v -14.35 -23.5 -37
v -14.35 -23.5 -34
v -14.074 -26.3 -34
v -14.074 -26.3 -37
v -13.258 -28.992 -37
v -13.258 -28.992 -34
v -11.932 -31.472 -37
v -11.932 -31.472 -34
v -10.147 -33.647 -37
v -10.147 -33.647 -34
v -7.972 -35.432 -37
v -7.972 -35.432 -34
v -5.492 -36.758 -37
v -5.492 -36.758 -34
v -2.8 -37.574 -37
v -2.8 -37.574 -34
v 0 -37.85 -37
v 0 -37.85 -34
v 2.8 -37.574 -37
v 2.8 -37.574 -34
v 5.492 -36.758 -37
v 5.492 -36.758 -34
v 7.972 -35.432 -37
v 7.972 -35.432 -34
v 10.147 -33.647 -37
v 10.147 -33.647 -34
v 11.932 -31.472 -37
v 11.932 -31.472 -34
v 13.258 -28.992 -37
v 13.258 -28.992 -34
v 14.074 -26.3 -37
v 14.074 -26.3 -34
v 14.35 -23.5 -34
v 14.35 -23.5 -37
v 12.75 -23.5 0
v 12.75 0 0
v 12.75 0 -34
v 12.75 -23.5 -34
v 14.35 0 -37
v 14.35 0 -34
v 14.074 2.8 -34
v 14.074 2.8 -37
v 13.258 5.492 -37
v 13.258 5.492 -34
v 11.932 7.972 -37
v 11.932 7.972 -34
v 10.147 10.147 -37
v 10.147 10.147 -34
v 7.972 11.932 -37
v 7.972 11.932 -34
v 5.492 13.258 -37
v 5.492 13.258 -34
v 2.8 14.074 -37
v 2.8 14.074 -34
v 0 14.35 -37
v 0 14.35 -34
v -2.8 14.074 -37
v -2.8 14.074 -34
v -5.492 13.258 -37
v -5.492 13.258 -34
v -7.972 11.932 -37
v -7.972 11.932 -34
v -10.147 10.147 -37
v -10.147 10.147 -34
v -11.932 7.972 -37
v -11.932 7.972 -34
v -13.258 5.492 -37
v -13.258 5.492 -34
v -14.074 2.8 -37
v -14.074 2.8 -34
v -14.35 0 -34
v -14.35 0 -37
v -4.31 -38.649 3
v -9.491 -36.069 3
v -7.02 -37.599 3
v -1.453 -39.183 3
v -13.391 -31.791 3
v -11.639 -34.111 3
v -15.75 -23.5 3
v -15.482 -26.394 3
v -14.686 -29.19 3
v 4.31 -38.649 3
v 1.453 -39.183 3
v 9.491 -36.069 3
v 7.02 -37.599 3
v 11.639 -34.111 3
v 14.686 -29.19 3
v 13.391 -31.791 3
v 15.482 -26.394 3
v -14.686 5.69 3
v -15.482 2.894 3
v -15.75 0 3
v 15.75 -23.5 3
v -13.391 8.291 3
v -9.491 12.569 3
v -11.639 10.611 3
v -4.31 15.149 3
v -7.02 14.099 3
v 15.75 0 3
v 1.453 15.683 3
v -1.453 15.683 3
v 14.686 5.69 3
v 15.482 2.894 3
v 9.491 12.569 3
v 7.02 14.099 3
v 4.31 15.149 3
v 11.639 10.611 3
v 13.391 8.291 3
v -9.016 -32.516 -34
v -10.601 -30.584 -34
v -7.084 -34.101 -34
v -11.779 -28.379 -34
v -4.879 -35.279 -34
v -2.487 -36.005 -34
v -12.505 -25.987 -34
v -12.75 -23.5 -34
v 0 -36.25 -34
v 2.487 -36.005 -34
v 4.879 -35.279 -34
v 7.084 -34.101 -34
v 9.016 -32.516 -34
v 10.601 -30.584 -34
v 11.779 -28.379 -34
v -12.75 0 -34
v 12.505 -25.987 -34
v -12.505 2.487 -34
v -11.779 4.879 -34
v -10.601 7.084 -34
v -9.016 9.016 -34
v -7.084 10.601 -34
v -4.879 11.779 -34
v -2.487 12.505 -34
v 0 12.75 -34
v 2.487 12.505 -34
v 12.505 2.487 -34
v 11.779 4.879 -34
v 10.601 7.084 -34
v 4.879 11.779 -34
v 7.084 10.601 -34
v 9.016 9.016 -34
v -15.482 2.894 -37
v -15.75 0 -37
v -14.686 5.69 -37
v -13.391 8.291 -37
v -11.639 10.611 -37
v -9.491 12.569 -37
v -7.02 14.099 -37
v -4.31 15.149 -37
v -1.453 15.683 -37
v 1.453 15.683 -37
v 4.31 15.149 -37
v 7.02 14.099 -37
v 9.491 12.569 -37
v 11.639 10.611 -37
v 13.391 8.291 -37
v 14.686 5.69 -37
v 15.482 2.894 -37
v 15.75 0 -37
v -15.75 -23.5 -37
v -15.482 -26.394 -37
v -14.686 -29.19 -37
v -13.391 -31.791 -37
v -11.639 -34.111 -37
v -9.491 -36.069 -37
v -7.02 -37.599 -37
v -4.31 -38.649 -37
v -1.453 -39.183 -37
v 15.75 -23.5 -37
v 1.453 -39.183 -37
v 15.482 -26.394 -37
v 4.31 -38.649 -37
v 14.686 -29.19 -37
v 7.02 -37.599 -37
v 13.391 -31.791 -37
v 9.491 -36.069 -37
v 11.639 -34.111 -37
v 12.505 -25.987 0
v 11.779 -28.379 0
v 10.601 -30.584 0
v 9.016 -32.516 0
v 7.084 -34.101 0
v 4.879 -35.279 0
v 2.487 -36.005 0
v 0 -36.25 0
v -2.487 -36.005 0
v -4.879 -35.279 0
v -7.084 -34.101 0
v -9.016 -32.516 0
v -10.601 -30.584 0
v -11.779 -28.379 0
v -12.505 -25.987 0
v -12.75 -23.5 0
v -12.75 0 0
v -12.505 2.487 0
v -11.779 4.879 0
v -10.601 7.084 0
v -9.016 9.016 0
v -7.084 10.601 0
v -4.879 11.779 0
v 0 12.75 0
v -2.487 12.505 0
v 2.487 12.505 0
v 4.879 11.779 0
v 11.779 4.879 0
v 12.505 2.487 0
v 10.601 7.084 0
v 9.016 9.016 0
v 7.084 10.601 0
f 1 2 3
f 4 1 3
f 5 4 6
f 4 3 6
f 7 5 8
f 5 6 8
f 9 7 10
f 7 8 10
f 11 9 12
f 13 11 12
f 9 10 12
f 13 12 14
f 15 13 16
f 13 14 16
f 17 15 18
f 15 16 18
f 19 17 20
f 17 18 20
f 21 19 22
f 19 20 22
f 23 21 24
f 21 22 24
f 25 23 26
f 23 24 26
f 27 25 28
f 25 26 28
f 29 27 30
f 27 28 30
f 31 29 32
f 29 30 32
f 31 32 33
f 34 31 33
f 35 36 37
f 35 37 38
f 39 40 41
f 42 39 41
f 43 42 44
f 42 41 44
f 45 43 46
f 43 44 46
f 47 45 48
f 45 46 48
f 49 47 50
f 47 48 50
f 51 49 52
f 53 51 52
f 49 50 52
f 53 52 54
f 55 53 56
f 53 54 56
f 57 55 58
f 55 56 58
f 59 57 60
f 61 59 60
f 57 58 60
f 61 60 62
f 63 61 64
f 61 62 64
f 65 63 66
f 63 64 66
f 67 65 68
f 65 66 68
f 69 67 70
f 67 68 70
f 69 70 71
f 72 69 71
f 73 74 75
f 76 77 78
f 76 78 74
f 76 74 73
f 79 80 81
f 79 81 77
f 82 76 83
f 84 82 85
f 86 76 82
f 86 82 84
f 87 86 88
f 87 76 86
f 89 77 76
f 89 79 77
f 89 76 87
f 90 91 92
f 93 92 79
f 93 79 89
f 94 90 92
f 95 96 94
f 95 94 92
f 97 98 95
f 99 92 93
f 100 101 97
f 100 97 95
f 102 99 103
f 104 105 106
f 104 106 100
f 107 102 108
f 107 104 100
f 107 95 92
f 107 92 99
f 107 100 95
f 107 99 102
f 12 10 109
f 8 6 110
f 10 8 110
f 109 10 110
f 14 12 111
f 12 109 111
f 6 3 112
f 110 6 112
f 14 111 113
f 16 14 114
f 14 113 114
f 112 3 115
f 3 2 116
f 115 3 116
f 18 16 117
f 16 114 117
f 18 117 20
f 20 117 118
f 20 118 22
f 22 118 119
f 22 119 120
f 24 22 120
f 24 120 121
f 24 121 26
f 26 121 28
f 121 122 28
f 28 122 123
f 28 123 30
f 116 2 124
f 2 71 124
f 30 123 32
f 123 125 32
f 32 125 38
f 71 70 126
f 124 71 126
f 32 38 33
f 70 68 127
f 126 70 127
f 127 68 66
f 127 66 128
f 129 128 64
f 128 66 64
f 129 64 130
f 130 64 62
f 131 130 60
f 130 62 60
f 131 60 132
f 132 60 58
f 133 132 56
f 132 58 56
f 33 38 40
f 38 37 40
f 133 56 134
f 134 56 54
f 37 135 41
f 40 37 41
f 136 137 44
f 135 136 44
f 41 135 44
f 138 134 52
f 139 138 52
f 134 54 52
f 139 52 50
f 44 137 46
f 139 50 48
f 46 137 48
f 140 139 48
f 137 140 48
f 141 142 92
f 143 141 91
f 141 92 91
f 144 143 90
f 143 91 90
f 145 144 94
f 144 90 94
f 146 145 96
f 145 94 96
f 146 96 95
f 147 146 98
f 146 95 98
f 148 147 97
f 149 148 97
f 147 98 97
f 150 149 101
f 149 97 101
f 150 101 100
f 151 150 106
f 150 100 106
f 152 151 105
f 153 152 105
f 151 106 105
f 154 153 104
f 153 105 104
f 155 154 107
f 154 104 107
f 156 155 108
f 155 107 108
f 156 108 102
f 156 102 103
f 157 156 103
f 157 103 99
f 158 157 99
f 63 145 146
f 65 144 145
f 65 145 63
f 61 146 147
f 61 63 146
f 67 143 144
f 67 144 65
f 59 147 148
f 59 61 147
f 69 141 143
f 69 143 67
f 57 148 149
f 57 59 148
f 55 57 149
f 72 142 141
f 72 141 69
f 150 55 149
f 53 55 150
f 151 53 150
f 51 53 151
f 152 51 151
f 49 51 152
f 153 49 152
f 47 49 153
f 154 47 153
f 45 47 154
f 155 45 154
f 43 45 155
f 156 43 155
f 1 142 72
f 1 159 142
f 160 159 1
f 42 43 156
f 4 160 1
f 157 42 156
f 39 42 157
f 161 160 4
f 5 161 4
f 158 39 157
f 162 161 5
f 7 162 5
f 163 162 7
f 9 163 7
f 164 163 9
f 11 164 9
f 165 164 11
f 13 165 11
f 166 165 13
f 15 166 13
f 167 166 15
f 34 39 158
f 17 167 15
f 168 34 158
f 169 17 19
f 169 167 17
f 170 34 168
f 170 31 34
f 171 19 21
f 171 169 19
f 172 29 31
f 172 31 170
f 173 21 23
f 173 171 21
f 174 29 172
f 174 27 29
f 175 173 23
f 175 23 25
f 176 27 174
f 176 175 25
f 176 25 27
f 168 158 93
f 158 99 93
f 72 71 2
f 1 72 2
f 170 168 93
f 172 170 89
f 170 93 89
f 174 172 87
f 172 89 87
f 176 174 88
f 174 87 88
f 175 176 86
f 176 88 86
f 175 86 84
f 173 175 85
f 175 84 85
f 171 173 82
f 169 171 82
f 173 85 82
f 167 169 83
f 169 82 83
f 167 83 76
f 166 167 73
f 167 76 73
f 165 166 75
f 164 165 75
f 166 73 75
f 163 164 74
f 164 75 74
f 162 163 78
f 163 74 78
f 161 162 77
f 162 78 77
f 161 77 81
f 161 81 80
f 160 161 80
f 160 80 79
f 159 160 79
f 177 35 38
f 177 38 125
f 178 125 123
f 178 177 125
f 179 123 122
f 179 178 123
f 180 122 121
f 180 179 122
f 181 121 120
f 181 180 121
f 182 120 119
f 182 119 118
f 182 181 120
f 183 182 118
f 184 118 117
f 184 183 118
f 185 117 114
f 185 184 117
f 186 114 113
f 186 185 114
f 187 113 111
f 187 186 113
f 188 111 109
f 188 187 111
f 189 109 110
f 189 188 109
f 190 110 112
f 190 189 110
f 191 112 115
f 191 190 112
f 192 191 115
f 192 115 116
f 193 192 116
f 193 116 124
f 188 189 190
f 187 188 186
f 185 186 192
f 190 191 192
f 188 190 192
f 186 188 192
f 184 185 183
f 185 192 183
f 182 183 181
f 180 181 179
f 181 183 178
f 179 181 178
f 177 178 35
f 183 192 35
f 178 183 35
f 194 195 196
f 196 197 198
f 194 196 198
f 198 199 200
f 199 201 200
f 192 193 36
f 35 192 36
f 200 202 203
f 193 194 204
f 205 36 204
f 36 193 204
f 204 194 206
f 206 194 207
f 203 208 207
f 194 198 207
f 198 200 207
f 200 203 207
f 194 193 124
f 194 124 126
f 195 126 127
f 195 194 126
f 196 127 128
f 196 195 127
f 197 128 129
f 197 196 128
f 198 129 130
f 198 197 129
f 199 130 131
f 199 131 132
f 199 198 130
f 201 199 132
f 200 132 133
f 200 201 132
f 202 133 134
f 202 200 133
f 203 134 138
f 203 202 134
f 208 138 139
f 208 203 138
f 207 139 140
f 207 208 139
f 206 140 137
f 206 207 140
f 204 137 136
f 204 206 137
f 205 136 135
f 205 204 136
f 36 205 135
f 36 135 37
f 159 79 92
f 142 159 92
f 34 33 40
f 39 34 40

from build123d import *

# Parameters (mm, degrees)
F1_DEPTH = 3
F2_DEPTH = 34
F4_DEPTH = 3


with BuildPart() as f1:
    # F0 (on Top) → F1 (new body)
    with BuildSketch(Plane.XY):
        with BuildLine():
            Line((15.75, -23.5), (15.75, 0))
            ThreePointArc((15.75, 0), (0, 15.75), (-15.75, 0))
            Line((-15.75, 0), (-15.75, -23.5))
            ThreePointArc((-15.75, -23.5), (0, -39.25), (15.75, -23.5))
        make_face()
        with BuildLine():
            ThreePointArc((-12.75, 0), (0, 12.75), (12.75, 0))
            Line((12.75, 0), (12.75, -23.5))
            ThreePointArc((12.75, -23.5), (0, -36.25), (-12.75, -23.5))
            Line((-12.75, -23.5), (-12.75, 0))
        make_face(mode=Mode.SUBTRACT)
        with BuildLine():
            ThreePointArc((-12.75, 0), (0, -12.75), (12.75, 0))
            ThreePointArc((12.75, 0), (0, 12.75), (-12.75, 0))
        make_face()
        with BuildLine():
            Line((12.75, -23.5), (12.75, 0))
            ThreePointArc((12.75, 0), (0, -12.75), (-12.75, 0))
            Line((-12.75, 0), (-12.75, -23.5))
            ThreePointArc((-12.75, -23.5), (0, -36.25), (12.75, -23.5))
        make_face()
    extrude(amount=F1_DEPTH)

    # F0 (on Top) → F2 (join)
    with BuildSketch(Plane.XY):
        with BuildLine():
            Line((15.75, -23.5), (15.75, 0))
            ThreePointArc((15.75, 0), (0, 15.75), (-15.75, 0))
            Line((-15.75, 0), (-15.75, -23.5))
            ThreePointArc((-15.75, -23.5), (0, -39.25), (15.75, -23.5))
        make_face()
        with BuildLine():
            ThreePointArc((-12.75, 0), (0, 12.75), (12.75, 0))
            Line((12.75, 0), (12.75, -23.5))
            ThreePointArc((12.75, -23.5), (0, -36.25), (-12.75, -23.5))
            Line((-12.75, -23.5), (-12.75, 0))
        make_face(mode=Mode.SUBTRACT)
    extrude(amount=-F2_DEPTH)

    # F3 (on face) → F4 (join)
    with BuildSketch(Plane(origin=(0, 0, -34), x_dir=(1, 0, 0), z_dir=(0, 0, -1))):
        with BuildLine():
            ThreePointArc((-15.75, 0), (0, -15.75), (15.75, 0))
            Line((15.75, 0), (15.75, 23.5))
            ThreePointArc((15.75, 23.5), (0, 39.25), (-15.75, 23.5))
            Line((-15.75, 23.5), (-15.75, 0))
        make_face()
        with BuildLine():
            Line((-14.35, 0), (-14.35, 23.5))
            ThreePointArc((-14.35, 23.5), (0, 37.85), (14.35, 23.5))
            Line((14.35, 23.5), (14.35, 0))
            ThreePointArc((14.35, 0), (0, -14.35), (-14.35, 0))
        make_face(mode=Mode.SUBTRACT)
    extrude(amount=F4_DEPTH)


solid = f1.part
